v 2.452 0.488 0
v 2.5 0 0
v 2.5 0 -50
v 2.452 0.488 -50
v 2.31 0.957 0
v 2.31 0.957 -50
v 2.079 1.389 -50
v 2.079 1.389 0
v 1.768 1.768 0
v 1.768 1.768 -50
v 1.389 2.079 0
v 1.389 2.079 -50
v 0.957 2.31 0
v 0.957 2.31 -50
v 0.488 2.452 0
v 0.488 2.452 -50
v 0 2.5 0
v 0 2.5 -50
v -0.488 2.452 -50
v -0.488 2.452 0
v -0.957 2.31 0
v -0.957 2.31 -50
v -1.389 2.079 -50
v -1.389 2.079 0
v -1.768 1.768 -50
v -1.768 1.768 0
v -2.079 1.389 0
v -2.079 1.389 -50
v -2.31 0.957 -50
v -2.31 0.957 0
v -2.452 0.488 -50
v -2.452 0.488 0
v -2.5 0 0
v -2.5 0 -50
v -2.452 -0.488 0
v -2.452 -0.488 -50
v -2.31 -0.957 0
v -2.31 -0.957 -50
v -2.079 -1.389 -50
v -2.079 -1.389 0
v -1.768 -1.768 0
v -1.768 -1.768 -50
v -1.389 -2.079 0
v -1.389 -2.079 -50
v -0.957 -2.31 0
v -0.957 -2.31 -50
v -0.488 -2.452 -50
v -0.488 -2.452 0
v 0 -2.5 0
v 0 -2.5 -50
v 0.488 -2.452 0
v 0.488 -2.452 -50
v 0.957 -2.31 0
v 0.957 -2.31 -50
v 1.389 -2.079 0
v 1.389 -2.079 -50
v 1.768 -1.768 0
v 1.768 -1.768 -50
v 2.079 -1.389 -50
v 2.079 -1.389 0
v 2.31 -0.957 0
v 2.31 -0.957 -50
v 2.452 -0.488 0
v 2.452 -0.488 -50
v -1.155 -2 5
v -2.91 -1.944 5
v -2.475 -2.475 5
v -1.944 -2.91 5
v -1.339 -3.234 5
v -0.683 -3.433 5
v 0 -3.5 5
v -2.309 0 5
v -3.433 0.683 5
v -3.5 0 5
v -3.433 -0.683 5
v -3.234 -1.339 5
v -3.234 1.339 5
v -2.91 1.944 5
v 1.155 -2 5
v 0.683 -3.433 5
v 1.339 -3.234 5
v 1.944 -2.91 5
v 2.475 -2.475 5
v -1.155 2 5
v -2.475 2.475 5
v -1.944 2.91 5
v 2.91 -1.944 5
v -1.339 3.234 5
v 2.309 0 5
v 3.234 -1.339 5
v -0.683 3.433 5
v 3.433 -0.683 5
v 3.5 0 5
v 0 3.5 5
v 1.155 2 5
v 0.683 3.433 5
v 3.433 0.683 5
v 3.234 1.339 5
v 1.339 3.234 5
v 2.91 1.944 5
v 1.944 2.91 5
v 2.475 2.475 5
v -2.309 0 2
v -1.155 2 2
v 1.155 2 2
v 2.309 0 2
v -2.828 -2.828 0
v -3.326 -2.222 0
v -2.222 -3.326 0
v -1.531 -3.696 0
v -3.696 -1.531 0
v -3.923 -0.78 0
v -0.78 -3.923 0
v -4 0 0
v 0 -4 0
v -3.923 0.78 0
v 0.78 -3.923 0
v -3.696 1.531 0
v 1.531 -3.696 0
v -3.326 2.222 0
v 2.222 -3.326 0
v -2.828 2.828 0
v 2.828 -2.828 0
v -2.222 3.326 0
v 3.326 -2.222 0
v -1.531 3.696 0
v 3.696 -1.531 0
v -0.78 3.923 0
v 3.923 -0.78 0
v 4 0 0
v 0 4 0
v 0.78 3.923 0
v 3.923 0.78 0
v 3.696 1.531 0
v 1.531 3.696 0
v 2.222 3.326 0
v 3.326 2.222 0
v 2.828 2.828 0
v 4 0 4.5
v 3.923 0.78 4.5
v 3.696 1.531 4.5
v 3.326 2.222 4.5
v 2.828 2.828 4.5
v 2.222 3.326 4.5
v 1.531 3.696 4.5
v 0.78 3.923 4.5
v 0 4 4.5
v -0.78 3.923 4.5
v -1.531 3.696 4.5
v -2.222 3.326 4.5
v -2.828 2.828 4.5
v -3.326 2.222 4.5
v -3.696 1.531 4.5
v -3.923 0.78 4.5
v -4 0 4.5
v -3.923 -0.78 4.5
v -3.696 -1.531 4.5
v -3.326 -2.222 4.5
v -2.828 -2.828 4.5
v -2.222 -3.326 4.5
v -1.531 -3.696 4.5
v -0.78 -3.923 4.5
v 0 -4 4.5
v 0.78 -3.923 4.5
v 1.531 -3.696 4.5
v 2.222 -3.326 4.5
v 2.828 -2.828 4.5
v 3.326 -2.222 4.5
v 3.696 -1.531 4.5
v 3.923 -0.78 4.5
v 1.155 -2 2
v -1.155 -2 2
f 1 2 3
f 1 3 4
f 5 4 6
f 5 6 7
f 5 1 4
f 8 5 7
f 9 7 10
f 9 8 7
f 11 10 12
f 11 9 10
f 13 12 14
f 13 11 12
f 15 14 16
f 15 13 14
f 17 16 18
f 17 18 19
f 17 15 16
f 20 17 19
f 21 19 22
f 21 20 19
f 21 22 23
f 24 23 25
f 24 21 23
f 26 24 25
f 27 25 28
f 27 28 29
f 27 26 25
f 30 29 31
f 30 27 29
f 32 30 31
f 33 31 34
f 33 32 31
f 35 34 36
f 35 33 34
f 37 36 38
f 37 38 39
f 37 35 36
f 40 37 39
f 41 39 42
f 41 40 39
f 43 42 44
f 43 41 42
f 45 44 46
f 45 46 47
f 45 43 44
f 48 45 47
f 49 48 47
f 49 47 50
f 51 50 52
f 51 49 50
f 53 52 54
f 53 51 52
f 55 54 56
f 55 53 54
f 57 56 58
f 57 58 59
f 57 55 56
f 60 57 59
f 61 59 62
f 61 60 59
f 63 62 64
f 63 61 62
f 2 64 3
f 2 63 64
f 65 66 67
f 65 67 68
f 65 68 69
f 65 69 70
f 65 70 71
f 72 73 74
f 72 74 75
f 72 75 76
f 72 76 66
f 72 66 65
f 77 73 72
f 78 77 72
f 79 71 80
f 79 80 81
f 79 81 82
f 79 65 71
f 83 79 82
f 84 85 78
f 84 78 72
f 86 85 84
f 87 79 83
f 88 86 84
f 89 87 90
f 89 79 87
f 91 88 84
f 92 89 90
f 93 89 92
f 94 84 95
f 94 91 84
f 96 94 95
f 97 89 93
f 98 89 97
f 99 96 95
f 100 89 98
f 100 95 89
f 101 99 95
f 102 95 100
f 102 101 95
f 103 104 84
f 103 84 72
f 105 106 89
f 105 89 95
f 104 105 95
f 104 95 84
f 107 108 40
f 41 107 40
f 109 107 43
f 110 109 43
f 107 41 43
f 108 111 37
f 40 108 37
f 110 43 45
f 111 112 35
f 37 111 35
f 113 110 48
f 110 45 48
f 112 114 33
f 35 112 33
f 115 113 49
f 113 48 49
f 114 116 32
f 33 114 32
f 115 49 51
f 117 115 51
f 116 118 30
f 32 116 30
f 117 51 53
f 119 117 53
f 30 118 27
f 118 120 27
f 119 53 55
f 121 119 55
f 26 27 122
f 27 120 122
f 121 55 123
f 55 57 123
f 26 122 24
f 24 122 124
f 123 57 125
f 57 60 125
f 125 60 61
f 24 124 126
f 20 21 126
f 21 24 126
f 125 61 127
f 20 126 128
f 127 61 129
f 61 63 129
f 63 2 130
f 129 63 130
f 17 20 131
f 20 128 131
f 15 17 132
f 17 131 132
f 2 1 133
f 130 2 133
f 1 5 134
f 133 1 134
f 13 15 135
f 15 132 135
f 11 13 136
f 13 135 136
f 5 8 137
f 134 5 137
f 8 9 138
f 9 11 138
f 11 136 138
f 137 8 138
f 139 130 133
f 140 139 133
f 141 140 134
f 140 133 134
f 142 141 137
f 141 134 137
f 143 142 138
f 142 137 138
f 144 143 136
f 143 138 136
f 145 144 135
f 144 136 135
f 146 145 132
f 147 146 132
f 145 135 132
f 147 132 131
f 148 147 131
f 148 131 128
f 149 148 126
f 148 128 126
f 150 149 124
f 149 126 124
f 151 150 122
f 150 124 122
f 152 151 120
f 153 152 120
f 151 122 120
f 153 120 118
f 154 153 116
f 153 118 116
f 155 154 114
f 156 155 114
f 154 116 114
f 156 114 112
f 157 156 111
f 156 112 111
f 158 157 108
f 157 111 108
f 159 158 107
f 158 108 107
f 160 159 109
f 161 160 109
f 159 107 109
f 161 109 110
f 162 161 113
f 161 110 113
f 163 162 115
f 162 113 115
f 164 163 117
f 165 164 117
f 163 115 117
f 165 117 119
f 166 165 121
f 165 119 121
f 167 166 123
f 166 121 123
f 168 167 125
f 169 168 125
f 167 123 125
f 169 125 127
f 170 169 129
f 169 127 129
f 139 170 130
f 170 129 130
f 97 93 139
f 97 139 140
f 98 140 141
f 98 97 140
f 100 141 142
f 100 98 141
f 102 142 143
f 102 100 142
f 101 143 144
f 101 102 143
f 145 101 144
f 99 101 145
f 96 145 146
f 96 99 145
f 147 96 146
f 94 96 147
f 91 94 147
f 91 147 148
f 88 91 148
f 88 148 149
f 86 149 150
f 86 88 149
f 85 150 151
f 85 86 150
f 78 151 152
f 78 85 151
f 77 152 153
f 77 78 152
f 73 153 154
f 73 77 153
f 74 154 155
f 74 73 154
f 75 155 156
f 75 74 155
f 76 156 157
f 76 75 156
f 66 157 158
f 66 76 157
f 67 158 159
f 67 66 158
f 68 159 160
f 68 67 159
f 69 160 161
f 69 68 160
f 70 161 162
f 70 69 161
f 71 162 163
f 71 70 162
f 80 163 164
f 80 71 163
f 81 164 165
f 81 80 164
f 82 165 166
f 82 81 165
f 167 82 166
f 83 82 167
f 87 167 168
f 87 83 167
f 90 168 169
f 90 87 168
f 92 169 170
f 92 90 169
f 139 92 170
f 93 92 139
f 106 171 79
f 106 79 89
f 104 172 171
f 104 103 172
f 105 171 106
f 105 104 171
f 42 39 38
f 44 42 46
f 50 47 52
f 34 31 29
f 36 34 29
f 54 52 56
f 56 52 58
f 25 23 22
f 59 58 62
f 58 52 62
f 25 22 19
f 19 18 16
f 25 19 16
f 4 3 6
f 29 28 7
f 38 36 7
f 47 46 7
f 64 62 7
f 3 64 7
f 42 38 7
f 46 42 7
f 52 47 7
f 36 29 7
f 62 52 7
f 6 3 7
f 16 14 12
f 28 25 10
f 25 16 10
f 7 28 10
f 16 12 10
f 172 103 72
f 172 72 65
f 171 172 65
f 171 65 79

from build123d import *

# Parameters (mm, degrees)
F0_R     = 4
F0_R_2   = 2.5
F1_DEPTH = 5
F2_START = 2
F2_DEPTH = 3
F3_DEPTH = 50
F4_SIZE  = 0.5


with BuildPart() as f1:
    # F0 (on Top) → F1 (new body)
    with BuildSketch(Plane.XY):
        Circle(F0_R)
        Circle(F0_R_2, mode=Mode.SUBTRACT)
        Circle(F0_R_2)
        Polygon((2.3094010768, 0), (1.1547005384, -2), (-1.1547005384, -2), (-2.3094010768, 0), (-1.1547005384, 2), (1.1547005384, 2), align=None, mode=Mode.SUBTRACT)
        Polygon((-1.1547005384, -2), (1.1547005384, -2), (2.3094010768, 0), (1.1547005384, 2), (-1.1547005384, 2), (-2.3094010768, 0), align=None)
    extrude(amount=F1_DEPTH)

    # F0 (on Top) → F2 (cut)
    with BuildSketch(Plane.XY.offset(F2_START)):
        Polygon((-1.1547005384, -2), (1.1547005384, -2), (2.3094010768, 0), (1.1547005384, 2), (-1.1547005384, 2), (-2.3094010768, 0), align=None)
    extrude(amount=F2_DEPTH, mode=Mode.SUBTRACT)

    # F0 (on Top) → F3 (join)
    with BuildSketch(Plane.XY):
        Circle(F0_R_2)
        Polygon((2.3094010768, 0), (1.1547005384, -2), (-1.1547005384, -2), (-2.3094010768, 0), (-1.1547005384, 2), (1.1547005384, 2), align=None, mode=Mode.SUBTRACT)
        Polygon((-1.1547005384, -2), (1.1547005384, -2), (2.3094010768, 0), (1.1547005384, 2), (-1.1547005384, 2), (-2.3094010768, 0), align=None)
    extrude(amount=-F3_DEPTH)

    # F4
    f4_edges = [f1.edges().sort_by_distance(p)[0] for p in [
        (-4, 0, 5),
    ]]
    chamfer(f4_edges, length=F4_SIZE)


solid = f1.part
